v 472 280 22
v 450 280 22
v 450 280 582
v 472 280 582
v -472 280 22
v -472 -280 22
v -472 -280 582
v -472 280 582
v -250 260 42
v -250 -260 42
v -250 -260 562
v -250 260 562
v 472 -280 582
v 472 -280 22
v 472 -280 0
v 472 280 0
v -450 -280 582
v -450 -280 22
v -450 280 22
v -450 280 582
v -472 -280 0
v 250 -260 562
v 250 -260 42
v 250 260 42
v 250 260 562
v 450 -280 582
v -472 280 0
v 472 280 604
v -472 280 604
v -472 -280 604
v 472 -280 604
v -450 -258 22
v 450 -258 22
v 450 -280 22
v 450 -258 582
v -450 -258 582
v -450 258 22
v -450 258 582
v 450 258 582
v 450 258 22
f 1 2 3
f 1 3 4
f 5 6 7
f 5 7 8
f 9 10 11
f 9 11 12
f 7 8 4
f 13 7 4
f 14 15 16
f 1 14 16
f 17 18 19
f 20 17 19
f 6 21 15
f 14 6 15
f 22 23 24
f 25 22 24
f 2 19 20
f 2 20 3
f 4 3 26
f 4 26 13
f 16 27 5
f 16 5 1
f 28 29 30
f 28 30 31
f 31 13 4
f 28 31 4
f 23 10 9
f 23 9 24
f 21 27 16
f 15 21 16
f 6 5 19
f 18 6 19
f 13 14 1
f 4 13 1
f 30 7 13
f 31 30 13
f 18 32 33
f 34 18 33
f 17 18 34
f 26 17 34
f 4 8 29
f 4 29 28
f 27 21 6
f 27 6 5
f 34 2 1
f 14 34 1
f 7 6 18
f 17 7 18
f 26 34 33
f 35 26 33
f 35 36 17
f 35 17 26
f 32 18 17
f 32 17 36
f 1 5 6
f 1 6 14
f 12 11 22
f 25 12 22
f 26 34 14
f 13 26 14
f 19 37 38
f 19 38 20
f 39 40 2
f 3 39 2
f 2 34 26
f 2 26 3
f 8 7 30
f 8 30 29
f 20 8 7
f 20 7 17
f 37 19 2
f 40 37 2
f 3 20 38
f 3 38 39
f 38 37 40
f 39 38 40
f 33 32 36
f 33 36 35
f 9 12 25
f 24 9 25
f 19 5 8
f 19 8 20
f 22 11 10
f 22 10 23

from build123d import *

# Parameters (mm, degrees)
BOX_W        = 500
BOX_H        = 520
BOX_DEPTH    = 520
BOX001_W     = 944
BOX001_H     = 560
BOX001_DEPTH = 22
BOX002_W     = 944
BOX002_H     = 560
BOX002_DEPTH = 22
BOX003_W     = 22
BOX003_H     = 560
BOX003_DEPTH = 560
BOX004_W     = 22
BOX004_H     = 560
BOX004_DEPTH = 560
BOX005_W     = 900
BOX005_H     = 22
BOX005_DEPTH = 560
BOX006_W     = 900
BOX006_H     = 22
BOX006_DEPTH = 560


with BuildPart() as cube:
    # Box → Box (new body)
    with BuildSketch(Plane(origin=(-250, -260, 42), x_dir=(1, 0, 0), z_dir=(0, 0, 1))):
        with Locations((250, 260)):
            Rectangle(BOX_W, BOX_H)
    extrude(amount=BOX_DEPTH)


with BuildPart() as cube001:
    # Box001 → Box001 (new body)
    with BuildSketch(Plane(origin=(-472, -280, 0), x_dir=(1, 0, 0), z_dir=(0, 0, 1))):
        with Locations((472, 280)):
            Rectangle(BOX001_W, BOX001_H)
    extrude(amount=BOX001_DEPTH)


with BuildPart() as cube002:
    # Box002 → Box002 (new body)
    with BuildSketch(Plane(origin=(-472, -280, 582), x_dir=(1, 0, 0), z_dir=(0, 0, 1))):
        with Locations((472, 280)):
            Rectangle(BOX002_W, BOX002_H)
    extrude(amount=BOX002_DEPTH)


with BuildPart() as cube003:
    # Box003 → Box003 (new body)
    with BuildSketch(Plane(origin=(-472, -280, 22), x_dir=(1, 0, 0), z_dir=(0, 0, 1))):
        with Locations((11, 280)):
            Rectangle(BOX003_W, BOX003_H)
    extrude(amount=BOX003_DEPTH)


with BuildPart() as cube004:
    # Box004 → Box004 (new body)
    with BuildSketch(Plane(origin=(450, -280, 22), x_dir=(1, 0, 0), z_dir=(0, 0, 1))):
        with Locations((11, 280)):
            Rectangle(BOX004_W, BOX004_H)
    extrude(amount=BOX004_DEPTH)


with BuildPart() as cube005:
    # Box005 → Box005 (new body)
    with BuildSketch(Plane(origin=(-450, 258, 22), x_dir=(1, 0, 0), z_dir=(0, 0, 1))):
        with Locations((450, 11)):
            Rectangle(BOX005_W, BOX005_H)
    extrude(amount=BOX005_DEPTH)


with BuildPart() as cube006:
    # Box006 → Box006 (new body)
    with BuildSketch(Plane(origin=(-450, -280, 22), x_dir=(1, 0, 0), z_dir=(0, 0, 1))):
        with Locations((450, 11)):
            Rectangle(BOX006_W, BOX006_H)
    extrude(amount=BOX006_DEPTH)


solid = Compound([cube.part, cube001.part, cube002.part, cube003.part, cube004.part, cube005.part, cube006.part])
